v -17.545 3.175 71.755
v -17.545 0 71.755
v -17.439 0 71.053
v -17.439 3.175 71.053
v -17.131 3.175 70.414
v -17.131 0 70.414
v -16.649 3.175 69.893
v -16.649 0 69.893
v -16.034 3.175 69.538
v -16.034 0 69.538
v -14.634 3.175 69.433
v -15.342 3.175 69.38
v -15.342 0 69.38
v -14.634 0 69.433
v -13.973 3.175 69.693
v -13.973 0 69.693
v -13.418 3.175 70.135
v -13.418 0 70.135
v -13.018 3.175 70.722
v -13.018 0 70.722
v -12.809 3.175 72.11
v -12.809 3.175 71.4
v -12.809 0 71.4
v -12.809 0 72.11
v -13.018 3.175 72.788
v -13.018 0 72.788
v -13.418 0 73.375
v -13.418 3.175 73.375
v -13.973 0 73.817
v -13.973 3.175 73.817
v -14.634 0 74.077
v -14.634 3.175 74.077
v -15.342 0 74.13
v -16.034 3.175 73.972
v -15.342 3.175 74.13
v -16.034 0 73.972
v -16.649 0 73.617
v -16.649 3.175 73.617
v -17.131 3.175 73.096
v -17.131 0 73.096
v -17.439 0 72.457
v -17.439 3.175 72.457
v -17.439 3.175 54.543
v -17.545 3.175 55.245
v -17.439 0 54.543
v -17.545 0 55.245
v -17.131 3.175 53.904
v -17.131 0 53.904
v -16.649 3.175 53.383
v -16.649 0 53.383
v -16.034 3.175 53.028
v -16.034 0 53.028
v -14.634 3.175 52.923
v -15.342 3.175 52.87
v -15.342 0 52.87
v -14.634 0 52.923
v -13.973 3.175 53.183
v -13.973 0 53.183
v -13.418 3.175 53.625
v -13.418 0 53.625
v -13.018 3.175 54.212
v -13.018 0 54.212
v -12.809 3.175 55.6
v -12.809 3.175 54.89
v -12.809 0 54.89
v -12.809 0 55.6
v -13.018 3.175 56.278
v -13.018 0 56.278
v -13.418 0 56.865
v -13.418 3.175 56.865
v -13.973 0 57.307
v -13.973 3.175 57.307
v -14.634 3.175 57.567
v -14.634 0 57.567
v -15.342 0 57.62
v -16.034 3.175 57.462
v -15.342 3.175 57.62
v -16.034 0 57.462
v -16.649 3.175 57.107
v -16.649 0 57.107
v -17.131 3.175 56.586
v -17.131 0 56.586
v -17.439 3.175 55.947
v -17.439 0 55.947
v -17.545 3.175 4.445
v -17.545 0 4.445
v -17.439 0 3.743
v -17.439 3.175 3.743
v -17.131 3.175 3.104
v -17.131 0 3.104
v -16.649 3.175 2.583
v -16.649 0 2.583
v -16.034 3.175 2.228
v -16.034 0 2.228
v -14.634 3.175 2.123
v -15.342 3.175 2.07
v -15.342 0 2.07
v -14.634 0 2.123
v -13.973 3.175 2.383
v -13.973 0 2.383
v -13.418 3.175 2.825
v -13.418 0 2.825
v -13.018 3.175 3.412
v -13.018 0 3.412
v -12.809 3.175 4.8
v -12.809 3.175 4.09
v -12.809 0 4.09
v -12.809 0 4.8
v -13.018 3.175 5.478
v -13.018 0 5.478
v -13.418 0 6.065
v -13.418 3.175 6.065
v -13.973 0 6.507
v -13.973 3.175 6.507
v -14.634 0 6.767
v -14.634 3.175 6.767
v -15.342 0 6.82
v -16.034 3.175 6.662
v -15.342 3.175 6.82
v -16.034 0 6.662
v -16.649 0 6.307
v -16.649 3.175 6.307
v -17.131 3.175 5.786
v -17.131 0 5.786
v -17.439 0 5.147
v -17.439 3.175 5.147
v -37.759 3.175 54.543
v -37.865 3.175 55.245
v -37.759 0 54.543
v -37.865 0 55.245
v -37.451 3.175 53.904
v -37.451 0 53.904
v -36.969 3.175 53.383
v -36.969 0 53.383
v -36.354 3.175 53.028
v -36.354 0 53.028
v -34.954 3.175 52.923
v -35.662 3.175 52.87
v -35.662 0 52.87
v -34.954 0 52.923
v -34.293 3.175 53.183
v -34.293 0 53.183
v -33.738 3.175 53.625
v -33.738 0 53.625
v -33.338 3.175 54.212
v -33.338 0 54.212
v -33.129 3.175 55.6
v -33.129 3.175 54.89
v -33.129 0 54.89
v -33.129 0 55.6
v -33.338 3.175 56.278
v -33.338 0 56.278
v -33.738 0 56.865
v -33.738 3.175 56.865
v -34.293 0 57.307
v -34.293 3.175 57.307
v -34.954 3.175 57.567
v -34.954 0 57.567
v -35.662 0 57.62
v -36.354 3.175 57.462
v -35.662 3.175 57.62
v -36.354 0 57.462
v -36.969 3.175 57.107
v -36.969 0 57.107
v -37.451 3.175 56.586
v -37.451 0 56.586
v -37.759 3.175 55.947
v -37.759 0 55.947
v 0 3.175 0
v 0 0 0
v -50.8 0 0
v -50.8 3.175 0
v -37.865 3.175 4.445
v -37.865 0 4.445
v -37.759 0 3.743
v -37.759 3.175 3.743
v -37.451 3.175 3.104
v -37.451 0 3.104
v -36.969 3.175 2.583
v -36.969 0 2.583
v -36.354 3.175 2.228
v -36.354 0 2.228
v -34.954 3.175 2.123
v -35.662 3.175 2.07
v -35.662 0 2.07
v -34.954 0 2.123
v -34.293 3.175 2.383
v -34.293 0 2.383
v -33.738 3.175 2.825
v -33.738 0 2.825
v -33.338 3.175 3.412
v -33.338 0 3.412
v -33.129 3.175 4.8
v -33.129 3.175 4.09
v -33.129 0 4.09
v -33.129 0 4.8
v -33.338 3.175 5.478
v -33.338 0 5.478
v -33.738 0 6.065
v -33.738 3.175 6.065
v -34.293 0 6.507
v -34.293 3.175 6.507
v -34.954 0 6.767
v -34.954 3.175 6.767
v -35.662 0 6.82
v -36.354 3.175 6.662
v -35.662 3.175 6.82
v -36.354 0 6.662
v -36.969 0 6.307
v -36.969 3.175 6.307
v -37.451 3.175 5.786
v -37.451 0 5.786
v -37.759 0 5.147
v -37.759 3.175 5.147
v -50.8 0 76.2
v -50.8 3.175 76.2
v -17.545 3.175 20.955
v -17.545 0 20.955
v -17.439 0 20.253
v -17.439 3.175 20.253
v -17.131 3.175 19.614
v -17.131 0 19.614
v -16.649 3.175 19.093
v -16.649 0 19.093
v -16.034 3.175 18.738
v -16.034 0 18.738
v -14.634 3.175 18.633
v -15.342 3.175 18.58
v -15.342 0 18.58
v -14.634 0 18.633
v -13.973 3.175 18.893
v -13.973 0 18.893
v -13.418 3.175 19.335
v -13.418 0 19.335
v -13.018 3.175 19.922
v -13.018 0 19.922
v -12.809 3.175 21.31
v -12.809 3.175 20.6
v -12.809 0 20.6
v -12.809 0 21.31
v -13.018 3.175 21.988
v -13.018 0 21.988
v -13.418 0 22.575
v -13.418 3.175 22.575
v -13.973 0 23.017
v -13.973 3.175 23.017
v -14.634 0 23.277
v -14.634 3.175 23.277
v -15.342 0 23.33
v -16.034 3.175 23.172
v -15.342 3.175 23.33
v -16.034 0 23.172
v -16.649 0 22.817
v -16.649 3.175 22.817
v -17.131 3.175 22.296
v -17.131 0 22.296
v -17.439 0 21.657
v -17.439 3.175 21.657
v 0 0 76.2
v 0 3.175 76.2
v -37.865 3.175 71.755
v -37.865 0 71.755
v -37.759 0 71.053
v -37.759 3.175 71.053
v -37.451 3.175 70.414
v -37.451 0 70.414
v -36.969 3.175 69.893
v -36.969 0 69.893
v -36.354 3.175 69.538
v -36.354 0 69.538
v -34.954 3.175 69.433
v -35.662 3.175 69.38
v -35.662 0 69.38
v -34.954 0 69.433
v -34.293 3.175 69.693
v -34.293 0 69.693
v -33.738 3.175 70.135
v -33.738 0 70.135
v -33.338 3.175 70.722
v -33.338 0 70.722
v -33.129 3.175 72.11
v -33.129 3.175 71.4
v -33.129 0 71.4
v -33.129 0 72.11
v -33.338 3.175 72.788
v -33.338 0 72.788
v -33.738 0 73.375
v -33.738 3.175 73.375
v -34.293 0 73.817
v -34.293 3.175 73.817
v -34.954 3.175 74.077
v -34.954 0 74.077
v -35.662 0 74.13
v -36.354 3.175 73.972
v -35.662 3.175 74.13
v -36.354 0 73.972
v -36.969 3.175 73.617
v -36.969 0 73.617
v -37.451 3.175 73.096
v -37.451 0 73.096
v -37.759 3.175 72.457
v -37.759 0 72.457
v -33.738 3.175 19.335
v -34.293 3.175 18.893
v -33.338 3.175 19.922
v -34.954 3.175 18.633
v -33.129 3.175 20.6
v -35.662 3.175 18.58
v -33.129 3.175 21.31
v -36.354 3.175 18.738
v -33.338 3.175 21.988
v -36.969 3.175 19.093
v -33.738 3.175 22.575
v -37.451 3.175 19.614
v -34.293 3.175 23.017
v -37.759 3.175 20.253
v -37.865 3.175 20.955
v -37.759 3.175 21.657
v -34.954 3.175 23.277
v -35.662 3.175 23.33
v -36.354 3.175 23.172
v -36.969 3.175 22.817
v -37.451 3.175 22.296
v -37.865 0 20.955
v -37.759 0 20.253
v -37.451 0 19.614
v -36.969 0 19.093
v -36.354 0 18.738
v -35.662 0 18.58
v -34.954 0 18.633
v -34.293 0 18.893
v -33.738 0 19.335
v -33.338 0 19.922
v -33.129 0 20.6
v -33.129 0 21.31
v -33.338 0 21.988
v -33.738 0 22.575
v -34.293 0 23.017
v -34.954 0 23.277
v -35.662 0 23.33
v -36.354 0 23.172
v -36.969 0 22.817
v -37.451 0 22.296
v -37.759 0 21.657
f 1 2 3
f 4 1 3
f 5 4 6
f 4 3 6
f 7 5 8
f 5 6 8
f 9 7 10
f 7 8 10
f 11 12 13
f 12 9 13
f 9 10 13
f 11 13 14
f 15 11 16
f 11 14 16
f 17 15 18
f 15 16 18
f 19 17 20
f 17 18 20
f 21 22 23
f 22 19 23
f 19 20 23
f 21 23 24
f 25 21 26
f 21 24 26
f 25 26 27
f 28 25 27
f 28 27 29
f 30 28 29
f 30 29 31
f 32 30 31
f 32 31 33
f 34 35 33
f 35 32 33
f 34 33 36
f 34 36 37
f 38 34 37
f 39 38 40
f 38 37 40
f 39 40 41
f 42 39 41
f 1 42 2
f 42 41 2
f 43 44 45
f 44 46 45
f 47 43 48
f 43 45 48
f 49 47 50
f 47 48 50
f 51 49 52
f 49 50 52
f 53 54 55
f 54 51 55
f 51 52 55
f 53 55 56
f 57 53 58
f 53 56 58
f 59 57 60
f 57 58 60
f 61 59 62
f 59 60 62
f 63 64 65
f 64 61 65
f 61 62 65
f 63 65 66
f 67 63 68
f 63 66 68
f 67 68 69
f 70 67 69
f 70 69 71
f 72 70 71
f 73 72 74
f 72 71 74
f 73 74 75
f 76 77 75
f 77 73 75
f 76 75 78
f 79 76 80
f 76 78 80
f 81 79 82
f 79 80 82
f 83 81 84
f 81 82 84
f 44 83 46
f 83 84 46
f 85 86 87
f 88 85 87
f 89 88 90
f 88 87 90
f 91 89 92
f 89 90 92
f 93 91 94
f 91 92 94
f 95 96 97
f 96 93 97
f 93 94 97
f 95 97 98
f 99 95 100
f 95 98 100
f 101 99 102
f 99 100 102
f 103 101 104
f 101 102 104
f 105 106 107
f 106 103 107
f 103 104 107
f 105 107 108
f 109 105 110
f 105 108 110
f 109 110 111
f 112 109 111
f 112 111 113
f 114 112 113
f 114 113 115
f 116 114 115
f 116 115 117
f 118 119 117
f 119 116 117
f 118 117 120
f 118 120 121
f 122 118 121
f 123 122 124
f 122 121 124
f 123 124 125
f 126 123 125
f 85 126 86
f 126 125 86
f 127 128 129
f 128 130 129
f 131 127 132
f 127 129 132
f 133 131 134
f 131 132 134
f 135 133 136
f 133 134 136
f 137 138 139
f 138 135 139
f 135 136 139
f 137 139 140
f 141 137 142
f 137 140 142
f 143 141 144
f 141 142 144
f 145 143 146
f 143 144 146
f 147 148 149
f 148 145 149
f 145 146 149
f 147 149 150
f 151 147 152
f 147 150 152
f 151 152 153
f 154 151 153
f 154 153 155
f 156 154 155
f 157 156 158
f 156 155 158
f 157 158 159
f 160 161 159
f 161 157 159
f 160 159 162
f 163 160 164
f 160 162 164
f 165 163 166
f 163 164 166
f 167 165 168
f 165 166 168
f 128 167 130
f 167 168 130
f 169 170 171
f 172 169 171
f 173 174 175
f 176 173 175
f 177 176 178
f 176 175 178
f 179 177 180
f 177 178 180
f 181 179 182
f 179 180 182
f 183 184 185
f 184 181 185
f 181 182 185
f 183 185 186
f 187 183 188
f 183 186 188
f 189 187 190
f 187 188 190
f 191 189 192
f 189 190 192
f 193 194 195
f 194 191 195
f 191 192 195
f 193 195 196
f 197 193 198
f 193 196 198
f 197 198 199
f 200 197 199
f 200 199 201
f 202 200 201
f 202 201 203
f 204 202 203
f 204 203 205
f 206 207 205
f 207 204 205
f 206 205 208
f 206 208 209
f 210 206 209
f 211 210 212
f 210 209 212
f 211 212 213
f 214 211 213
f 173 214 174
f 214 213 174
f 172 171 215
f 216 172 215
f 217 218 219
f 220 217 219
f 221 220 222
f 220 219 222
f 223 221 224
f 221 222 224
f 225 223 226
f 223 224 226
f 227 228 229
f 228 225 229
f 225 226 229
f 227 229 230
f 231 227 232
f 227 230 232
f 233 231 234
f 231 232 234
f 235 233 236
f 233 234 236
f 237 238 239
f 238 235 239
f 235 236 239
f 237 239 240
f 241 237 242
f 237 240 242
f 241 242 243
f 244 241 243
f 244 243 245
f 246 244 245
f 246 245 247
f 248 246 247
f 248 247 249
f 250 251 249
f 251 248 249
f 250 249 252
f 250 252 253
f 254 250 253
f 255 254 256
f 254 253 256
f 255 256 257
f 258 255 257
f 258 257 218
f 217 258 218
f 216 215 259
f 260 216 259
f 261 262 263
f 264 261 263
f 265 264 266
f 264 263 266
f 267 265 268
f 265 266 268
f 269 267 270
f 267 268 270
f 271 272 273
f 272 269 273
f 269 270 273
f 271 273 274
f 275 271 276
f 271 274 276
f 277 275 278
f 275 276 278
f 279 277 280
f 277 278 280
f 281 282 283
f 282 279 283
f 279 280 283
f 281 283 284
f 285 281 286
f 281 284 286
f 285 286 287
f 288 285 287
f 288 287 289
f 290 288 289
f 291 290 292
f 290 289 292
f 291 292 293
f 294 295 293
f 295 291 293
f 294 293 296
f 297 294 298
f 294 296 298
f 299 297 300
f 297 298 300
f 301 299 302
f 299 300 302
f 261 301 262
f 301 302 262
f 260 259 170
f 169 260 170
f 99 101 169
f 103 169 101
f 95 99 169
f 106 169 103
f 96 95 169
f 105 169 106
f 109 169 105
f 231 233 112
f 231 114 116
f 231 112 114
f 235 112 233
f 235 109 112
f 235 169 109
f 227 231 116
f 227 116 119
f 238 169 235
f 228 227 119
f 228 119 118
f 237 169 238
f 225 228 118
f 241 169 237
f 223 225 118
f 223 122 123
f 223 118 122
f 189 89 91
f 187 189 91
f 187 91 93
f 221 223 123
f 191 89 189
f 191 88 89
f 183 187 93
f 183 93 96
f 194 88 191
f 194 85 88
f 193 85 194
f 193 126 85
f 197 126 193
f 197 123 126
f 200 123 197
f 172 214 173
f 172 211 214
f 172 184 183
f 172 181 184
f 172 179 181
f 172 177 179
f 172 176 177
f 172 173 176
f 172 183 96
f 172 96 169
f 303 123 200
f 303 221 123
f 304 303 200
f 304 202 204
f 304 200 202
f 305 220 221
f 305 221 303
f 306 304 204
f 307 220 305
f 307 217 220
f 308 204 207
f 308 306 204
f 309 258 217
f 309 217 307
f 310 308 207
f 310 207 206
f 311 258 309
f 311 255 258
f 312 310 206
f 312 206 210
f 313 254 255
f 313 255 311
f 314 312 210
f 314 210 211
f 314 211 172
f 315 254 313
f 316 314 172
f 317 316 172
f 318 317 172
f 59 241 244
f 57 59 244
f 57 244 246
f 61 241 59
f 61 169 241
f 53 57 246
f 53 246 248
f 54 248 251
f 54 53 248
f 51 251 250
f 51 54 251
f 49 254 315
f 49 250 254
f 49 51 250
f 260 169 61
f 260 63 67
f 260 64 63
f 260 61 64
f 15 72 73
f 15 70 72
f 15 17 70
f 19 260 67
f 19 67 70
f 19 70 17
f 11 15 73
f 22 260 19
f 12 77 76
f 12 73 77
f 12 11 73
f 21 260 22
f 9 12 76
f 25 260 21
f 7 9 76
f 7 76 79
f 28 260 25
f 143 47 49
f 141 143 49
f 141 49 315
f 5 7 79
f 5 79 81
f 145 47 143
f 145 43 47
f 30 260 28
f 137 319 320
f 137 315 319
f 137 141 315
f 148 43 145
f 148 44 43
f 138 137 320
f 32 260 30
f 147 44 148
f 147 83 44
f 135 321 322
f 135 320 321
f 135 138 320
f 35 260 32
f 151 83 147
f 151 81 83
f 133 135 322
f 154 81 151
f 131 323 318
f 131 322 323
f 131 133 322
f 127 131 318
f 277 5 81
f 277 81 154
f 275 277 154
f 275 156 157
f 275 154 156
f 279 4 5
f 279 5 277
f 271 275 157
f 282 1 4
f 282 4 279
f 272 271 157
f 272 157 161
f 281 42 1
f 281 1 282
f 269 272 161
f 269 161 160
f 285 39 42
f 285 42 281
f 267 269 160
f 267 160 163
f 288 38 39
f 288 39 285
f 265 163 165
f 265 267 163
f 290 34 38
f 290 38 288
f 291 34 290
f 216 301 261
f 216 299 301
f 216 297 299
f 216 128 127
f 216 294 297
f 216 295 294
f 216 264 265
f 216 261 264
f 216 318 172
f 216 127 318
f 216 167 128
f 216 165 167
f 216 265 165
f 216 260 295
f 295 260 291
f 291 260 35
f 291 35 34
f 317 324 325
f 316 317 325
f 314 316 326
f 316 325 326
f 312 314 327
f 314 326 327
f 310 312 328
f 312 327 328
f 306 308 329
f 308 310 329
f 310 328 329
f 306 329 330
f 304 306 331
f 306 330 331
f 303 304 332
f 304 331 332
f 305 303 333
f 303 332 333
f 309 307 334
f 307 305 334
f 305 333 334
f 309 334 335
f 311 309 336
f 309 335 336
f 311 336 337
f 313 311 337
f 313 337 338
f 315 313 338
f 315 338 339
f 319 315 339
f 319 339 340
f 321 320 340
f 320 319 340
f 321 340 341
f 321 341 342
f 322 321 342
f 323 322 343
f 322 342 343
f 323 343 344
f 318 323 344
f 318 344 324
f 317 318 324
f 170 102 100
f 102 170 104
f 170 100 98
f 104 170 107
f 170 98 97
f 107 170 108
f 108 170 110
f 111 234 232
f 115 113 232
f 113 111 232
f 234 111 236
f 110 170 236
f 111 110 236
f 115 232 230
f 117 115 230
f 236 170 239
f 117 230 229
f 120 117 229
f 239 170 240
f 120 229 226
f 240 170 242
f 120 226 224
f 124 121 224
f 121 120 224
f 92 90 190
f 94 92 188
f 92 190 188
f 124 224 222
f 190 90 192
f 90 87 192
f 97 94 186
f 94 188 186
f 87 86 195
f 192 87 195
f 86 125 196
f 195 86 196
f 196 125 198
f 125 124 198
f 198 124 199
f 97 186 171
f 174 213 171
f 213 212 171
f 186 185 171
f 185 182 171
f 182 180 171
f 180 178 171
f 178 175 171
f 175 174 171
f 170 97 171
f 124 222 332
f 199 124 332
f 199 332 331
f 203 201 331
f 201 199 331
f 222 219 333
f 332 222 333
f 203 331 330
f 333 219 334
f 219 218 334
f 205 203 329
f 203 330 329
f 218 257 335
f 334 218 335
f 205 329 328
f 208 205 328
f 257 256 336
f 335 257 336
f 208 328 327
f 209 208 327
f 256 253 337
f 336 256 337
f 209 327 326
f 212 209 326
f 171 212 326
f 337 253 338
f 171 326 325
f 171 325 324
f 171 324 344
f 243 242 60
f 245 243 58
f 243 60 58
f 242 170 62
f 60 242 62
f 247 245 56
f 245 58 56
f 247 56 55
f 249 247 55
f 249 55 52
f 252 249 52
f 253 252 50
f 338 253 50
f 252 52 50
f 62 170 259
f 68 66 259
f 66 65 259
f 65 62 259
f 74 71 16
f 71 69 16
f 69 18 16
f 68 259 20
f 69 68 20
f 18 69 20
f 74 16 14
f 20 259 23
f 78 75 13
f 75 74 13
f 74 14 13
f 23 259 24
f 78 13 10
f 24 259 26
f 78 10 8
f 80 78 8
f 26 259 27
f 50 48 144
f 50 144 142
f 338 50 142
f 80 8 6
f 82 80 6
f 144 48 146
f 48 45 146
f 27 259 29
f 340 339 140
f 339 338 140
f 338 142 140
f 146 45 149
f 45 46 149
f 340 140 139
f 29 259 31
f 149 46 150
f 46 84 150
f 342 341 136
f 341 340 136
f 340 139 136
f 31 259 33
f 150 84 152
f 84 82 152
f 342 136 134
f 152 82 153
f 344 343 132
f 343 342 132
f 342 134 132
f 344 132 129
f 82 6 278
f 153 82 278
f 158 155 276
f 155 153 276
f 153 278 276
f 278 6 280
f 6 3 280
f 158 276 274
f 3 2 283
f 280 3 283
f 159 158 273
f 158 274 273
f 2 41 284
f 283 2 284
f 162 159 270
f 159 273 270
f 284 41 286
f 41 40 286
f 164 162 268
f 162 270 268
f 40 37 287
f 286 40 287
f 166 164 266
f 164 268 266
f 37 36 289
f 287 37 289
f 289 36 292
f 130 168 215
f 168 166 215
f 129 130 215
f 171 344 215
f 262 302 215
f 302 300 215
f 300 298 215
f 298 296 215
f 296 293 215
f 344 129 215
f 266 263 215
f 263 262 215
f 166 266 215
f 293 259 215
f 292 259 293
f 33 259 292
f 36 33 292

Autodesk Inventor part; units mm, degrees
ref_plane "YZ Plane" through (0, 0, 0) normal (1, 0, 0) x (0, 1, 0)
ref_plane "XZ Plane" through (0, 0, 0) normal (0, 1, 0) x (-1, 0, 0)
ref_plane "XY Plane" through (0, 0, 0) normal (0, 0, 1) x (1, 0, 0)
sketch "Sketch1" plane through (0, 0, 0) normal (0, 1, 0) x (-1, 0, 0)
  line L0 (0, 0) -> (50.8, 0)
  line L1 (50.8, 0) -> (50.8, 76.2)
  line L2 (50.8, 76.2) -> (0, 76.2)
  line L3 (0, 76.2) -> (0, 0)
  circle A0 centre (35.4838, 71.755) radius 2.3813
  circle A1 centre (35.4838, 55.245) radius 2.3813
  circle A2 centre (15.1638, 71.755) radius 2.3813
  circle A3 centre (15.1638, 55.245) radius 2.3813
  line L4 (50.8, 38.1) -> (0, 38.1)
  circle A4 centre (35.4838, 4.445) radius 2.3813
  circle A5 centre (35.4838, 20.955) radius 2.3813
  circle A6 centre (15.1638, 4.445) radius 2.3813
  circle A7 centre (15.1638, 20.955) radius 2.3813
  dimension "d0" = 50.8
  dimension "d1" = 76.2
  dimension "d2" = 4.7625
  dimension "d3" = 15.3162
  dimension "d4" = 4.445
  dimension "d7" = 16.51
  dimension "d10" = 20.32
extrude "Extrusion1" add sketch "Sketch1" along normal blind 3.175
properties part number "Gripper Slider Connecting Plate"
